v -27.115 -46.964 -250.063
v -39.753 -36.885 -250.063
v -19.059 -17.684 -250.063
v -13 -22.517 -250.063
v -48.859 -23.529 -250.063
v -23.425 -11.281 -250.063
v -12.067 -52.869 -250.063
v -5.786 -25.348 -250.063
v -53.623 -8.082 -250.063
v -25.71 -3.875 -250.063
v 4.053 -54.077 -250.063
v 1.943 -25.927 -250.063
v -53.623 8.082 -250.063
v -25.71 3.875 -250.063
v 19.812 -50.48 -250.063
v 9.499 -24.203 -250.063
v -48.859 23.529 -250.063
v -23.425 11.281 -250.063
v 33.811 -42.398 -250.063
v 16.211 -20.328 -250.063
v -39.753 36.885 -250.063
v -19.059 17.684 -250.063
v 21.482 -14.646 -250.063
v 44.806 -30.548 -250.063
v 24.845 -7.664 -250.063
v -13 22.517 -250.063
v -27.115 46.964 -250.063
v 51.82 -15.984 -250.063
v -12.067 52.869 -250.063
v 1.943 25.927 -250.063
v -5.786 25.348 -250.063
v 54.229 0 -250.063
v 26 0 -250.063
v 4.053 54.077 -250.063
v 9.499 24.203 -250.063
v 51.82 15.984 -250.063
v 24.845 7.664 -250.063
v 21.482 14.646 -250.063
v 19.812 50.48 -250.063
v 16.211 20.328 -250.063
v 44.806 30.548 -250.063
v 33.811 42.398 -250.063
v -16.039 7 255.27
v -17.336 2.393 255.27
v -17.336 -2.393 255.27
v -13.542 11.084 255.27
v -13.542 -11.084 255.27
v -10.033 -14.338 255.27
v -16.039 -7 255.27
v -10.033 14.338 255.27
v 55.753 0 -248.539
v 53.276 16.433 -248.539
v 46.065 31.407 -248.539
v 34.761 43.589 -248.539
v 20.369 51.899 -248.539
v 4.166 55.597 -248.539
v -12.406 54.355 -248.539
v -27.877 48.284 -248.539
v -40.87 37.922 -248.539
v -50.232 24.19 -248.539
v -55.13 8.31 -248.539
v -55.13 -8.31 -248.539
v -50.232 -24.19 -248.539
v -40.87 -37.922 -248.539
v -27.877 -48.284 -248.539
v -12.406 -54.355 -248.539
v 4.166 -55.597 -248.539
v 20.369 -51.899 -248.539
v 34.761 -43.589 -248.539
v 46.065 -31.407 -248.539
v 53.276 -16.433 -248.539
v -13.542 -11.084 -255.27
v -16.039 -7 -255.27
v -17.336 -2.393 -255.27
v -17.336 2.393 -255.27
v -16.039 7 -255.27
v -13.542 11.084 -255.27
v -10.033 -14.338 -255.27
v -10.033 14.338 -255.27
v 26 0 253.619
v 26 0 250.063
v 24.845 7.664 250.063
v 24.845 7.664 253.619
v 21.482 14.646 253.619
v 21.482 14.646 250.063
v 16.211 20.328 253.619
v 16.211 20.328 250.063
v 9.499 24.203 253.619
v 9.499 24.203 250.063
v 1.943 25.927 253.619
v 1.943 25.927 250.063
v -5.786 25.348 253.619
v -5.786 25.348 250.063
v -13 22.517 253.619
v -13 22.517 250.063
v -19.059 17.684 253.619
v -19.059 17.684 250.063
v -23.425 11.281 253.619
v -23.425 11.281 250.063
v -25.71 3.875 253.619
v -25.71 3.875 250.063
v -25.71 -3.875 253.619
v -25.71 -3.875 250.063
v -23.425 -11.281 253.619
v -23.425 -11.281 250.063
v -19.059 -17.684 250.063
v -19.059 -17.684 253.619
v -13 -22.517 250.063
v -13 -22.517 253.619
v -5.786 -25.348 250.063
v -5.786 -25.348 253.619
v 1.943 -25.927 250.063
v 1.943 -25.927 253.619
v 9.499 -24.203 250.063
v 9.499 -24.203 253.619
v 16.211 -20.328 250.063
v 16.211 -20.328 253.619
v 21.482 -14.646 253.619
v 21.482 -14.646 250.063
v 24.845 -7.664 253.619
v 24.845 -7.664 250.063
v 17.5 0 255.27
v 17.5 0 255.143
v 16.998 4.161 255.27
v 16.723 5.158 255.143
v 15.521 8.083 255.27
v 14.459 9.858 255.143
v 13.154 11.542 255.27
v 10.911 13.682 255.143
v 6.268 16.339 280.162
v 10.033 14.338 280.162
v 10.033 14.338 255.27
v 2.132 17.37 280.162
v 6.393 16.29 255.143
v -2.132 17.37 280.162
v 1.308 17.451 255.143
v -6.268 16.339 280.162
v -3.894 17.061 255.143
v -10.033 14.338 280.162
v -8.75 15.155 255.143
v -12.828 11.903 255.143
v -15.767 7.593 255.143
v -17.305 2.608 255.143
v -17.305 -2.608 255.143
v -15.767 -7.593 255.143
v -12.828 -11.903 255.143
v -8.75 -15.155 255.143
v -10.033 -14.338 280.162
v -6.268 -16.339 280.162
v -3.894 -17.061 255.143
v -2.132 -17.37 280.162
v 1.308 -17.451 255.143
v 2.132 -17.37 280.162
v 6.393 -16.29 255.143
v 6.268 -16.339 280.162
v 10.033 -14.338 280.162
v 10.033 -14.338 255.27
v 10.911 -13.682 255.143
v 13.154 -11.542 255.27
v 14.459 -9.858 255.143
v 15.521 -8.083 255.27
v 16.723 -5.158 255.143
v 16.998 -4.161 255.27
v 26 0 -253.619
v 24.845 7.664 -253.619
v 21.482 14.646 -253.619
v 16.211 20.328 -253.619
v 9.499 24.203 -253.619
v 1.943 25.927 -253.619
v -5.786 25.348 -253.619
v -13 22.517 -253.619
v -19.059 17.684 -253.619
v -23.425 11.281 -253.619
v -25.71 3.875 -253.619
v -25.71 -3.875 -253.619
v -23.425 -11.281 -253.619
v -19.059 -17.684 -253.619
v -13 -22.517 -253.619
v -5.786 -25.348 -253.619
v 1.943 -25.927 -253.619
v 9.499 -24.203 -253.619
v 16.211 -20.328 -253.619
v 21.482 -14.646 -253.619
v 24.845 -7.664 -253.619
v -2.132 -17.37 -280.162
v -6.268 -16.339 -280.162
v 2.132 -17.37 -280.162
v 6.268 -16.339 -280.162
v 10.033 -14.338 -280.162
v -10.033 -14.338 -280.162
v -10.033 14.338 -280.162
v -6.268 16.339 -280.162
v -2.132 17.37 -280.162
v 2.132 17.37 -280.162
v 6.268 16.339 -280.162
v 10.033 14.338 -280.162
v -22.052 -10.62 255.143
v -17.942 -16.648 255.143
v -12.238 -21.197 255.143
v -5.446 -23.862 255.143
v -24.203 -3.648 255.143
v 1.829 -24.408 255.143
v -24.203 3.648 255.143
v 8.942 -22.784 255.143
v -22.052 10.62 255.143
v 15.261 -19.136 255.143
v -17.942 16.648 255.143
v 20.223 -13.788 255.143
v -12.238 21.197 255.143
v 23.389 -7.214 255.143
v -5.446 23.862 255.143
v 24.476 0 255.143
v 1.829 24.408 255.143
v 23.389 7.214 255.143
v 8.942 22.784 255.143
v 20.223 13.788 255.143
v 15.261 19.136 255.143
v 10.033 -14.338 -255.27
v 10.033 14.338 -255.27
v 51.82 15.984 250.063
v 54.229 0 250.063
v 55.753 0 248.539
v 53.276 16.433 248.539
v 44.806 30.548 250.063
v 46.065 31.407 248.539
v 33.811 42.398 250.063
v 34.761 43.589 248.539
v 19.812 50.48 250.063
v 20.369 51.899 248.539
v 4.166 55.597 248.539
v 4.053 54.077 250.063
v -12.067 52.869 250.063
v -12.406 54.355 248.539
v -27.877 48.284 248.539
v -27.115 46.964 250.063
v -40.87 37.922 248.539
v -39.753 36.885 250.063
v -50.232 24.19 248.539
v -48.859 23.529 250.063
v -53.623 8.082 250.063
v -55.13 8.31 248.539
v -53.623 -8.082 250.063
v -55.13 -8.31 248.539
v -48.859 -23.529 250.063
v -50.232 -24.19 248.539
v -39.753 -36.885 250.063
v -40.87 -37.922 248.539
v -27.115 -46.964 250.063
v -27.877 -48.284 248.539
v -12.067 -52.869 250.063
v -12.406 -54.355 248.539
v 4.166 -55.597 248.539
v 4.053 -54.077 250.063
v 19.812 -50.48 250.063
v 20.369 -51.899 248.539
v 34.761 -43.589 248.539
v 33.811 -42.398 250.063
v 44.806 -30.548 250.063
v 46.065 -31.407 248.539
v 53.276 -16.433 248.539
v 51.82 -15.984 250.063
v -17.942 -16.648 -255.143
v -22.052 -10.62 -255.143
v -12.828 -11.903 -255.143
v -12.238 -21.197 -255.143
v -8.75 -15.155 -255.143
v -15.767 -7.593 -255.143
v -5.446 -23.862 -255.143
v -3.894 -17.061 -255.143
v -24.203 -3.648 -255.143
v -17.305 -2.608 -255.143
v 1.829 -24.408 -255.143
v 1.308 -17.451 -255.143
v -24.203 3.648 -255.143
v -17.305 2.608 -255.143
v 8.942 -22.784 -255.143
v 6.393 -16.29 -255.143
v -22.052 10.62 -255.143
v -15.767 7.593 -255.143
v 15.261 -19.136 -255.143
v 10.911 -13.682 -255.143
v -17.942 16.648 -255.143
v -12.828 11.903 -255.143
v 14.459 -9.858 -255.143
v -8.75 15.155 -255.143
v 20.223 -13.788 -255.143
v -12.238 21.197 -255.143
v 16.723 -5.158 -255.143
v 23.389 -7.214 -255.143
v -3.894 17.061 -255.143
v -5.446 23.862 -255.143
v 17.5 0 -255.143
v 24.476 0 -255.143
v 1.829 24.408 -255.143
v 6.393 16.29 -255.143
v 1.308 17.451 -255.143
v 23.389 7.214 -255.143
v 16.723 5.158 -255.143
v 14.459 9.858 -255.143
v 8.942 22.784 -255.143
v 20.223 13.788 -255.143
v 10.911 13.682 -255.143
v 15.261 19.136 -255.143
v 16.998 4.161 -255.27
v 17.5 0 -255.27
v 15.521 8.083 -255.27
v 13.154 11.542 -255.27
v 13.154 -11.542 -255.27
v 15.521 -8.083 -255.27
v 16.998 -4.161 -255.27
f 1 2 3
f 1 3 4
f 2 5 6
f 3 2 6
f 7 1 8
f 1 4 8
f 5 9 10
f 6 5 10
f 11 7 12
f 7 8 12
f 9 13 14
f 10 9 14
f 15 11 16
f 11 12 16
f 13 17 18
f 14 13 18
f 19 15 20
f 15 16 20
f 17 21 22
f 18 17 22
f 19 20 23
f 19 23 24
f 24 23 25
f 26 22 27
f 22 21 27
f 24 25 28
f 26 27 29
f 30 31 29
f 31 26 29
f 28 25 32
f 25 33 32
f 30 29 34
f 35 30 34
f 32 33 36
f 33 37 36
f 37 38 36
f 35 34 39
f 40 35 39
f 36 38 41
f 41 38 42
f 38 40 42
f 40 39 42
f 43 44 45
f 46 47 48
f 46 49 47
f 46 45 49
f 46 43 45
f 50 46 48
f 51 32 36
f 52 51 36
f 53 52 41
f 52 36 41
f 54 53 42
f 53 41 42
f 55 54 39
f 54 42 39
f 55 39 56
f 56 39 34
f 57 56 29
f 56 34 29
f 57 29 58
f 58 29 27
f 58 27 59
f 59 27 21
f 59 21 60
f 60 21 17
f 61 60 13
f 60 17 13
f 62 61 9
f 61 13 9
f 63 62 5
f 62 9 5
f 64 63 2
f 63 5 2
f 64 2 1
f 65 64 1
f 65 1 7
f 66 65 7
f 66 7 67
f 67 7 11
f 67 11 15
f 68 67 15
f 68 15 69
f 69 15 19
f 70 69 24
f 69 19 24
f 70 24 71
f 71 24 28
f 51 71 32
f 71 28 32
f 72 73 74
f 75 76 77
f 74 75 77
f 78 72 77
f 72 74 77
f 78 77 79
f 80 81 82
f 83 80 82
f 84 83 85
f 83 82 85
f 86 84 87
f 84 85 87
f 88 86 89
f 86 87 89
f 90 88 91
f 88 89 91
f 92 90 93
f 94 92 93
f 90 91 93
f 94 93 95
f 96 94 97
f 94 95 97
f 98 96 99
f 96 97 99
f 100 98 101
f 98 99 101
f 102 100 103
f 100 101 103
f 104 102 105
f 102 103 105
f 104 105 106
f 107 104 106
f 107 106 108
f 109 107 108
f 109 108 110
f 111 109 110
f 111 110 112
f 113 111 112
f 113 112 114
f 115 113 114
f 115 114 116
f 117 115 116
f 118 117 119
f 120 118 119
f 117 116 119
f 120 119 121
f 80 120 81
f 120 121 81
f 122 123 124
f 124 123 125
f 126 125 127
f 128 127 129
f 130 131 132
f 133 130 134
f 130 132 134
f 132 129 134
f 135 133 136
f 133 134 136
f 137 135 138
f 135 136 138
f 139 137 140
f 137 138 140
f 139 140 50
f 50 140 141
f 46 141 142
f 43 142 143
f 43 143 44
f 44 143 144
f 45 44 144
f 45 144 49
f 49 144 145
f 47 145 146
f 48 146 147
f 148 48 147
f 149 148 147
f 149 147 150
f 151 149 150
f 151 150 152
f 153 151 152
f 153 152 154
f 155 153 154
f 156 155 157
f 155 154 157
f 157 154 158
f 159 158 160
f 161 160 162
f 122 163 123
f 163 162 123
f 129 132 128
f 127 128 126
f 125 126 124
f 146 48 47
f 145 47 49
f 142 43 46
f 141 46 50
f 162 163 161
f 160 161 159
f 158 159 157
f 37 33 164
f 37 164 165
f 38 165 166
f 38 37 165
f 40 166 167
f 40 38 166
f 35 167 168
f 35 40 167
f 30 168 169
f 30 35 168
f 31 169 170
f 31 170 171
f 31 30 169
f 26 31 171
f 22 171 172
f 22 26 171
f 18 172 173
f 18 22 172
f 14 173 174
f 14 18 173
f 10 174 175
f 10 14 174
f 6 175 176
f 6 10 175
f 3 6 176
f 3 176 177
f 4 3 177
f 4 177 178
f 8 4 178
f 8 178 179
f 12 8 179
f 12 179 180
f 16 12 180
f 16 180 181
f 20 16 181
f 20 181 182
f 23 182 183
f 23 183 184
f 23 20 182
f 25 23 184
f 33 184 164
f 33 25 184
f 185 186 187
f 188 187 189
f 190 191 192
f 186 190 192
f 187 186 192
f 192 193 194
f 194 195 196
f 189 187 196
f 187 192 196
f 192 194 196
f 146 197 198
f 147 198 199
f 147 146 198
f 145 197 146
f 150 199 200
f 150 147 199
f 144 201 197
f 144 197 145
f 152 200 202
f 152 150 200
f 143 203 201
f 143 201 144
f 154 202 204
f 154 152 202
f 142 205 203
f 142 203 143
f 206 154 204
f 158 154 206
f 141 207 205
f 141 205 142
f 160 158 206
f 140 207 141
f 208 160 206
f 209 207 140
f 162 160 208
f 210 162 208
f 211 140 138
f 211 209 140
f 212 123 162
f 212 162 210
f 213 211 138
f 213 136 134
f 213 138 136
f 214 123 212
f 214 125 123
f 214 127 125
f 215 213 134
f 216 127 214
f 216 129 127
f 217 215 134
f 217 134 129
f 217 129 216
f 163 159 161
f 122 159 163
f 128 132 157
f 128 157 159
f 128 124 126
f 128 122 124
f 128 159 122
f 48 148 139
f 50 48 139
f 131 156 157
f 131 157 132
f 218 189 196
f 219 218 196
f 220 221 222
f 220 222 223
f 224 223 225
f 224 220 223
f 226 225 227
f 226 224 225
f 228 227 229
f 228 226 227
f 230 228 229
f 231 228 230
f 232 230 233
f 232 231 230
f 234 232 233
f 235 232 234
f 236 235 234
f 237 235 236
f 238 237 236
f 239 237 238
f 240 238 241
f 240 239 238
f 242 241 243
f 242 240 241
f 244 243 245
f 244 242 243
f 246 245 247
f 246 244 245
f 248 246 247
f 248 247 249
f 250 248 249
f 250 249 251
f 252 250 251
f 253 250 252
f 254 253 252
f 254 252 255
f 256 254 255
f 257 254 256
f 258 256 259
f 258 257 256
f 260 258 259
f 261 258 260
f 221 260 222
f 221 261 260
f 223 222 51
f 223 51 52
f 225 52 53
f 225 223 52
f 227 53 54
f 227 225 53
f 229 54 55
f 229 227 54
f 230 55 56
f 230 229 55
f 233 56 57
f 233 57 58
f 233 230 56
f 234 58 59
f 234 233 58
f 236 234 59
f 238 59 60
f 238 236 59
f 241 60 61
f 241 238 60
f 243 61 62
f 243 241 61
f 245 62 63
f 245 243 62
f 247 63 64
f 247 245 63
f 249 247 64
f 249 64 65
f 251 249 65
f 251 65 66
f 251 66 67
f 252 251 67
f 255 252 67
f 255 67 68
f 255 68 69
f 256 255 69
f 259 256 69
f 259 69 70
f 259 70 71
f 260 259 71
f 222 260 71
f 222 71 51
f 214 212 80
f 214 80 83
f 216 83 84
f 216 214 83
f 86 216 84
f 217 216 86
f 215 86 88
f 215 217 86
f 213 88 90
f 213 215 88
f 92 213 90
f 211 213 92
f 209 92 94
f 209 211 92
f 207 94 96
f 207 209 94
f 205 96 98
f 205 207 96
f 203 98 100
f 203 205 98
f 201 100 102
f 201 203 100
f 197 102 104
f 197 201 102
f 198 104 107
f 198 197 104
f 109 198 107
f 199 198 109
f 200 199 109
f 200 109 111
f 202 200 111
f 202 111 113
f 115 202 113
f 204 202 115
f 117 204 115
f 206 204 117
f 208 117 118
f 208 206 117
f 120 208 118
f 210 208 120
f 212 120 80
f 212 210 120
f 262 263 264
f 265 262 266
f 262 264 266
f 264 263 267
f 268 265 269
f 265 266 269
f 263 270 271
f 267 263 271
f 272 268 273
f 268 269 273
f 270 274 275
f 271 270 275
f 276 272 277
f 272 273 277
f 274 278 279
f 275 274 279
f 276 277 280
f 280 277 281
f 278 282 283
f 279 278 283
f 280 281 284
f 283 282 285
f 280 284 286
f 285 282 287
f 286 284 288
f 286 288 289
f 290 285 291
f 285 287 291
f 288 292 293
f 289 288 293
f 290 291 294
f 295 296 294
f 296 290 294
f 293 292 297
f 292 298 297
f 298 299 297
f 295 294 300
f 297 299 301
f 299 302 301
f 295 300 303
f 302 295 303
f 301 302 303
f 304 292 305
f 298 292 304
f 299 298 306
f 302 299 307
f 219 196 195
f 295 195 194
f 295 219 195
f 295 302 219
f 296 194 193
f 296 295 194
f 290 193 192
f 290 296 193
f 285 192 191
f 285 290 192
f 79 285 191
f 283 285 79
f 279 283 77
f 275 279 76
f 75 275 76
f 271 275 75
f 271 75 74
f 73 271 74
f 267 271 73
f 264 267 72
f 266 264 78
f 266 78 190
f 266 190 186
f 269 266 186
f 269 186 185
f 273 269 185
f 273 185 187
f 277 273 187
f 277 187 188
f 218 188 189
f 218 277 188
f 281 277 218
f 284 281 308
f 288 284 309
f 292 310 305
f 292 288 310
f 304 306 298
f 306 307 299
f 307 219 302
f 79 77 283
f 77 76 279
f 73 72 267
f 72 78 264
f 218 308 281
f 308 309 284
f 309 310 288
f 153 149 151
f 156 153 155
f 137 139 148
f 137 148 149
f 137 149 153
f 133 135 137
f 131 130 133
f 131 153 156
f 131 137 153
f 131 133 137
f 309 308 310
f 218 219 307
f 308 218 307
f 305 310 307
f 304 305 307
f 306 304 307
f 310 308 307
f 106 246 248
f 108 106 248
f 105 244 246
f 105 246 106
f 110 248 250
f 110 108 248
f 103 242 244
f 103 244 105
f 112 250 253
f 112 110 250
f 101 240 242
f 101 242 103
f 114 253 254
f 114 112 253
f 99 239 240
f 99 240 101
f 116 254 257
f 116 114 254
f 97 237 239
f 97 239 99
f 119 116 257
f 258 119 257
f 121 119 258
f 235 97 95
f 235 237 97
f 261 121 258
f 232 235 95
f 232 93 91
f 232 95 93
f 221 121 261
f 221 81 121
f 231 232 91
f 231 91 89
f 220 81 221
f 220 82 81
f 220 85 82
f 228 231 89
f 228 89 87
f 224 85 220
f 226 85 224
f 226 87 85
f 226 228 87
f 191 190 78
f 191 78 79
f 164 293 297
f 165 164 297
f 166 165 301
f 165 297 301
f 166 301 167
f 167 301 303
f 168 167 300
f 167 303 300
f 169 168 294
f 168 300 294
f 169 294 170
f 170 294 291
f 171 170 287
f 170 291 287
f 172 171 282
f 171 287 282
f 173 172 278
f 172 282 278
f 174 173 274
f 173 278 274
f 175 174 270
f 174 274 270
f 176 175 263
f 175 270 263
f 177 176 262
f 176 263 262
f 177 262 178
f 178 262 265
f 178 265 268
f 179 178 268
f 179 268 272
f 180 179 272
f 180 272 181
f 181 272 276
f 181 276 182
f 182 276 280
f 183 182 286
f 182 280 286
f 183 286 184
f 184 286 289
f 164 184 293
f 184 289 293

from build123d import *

# Parameters (mm, degrees)
SKETCH1_R                = 55.753
EXTRUDE1_DEPTH           = 250.063
SKETCH2_R                = 26
EXTRUDE2_DEPTH           = 5.08
SKETCH3_R                = 17.5
EXTRUDE3_DEPTH           = 25.019
SKETCH4_W                = 7.467
SKETCH4_H                = 28.676743958
CUT_EXTRUDE1_DEPTH       = 24.892
CHAMFER1_SIZE            = 1.524
CHAMFER1_OF_MIRROR1_SIZE = 1.524


with BuildPart() as part:
    # Sketch1 → Extrude1 (new body)
    with BuildSketch(Plane.XY):
        Circle(SKETCH1_R)
    extrude1 = extrude(amount=EXTRUDE1_DEPTH)

    # Sketch2 → Extrude2 (add)
    with BuildSketch(Plane.XY.offset(250.063)):
        Circle(SKETCH2_R)
    extrude2 = extrude(amount=EXTRUDE2_DEPTH)

    # Sketch3 → Extrude3 (add)
    with BuildSketch(Plane.XY.offset(255.143)):
        Circle(SKETCH3_R)
    extrude3 = extrude(amount=EXTRUDE3_DEPTH)

    # Sketch4 → Cut-Extrude1 (cut)
    with BuildSketch(Plane.XY.offset(280.162)):
        with Locations((13.7665, 0)):
            Rectangle(SKETCH4_W, SKETCH4_H)
        with Locations((-13.7665, 0)):
            Rectangle(SKETCH4_W, SKETCH4_H)
    cut_extrude1 = extrude(amount=-CUT_EXTRUDE1_DEPTH, mode=Mode.SUBTRACT)

    # Chamfer1
    chamfer1_edges = [part.edges().sort_by_distance(p)[0] for p in [
        (-55.753, 0, 250.063),
        (-26, 0, 255.143),
    ]]
    chamfer(chamfer1_edges, length=CHAMFER1_SIZE)

    # Mirror1: Extrude1, Extrude2, Extrude3, Cut-Extrude1 across plane
    add(extrude1.mirror(Plane.XY))
    add(extrude2.mirror(Plane.XY))
    add(extrude3.mirror(Plane.XY))
    add(cut_extrude1.mirror(Plane.XY), mode=Mode.SUBTRACT)

    # Chamfer1 of Mirror1
    chamfer1_of_mirror1_edges = [part.edges().sort_by_distance(p)[0] for p in [
        (-55.753, 0, -250.063),
        (-26, 0, -255.143),
    ]]
    chamfer(chamfer1_of_mirror1_edges, length=CHAMFER1_OF_MIRROR1_SIZE)


solid = part.part
